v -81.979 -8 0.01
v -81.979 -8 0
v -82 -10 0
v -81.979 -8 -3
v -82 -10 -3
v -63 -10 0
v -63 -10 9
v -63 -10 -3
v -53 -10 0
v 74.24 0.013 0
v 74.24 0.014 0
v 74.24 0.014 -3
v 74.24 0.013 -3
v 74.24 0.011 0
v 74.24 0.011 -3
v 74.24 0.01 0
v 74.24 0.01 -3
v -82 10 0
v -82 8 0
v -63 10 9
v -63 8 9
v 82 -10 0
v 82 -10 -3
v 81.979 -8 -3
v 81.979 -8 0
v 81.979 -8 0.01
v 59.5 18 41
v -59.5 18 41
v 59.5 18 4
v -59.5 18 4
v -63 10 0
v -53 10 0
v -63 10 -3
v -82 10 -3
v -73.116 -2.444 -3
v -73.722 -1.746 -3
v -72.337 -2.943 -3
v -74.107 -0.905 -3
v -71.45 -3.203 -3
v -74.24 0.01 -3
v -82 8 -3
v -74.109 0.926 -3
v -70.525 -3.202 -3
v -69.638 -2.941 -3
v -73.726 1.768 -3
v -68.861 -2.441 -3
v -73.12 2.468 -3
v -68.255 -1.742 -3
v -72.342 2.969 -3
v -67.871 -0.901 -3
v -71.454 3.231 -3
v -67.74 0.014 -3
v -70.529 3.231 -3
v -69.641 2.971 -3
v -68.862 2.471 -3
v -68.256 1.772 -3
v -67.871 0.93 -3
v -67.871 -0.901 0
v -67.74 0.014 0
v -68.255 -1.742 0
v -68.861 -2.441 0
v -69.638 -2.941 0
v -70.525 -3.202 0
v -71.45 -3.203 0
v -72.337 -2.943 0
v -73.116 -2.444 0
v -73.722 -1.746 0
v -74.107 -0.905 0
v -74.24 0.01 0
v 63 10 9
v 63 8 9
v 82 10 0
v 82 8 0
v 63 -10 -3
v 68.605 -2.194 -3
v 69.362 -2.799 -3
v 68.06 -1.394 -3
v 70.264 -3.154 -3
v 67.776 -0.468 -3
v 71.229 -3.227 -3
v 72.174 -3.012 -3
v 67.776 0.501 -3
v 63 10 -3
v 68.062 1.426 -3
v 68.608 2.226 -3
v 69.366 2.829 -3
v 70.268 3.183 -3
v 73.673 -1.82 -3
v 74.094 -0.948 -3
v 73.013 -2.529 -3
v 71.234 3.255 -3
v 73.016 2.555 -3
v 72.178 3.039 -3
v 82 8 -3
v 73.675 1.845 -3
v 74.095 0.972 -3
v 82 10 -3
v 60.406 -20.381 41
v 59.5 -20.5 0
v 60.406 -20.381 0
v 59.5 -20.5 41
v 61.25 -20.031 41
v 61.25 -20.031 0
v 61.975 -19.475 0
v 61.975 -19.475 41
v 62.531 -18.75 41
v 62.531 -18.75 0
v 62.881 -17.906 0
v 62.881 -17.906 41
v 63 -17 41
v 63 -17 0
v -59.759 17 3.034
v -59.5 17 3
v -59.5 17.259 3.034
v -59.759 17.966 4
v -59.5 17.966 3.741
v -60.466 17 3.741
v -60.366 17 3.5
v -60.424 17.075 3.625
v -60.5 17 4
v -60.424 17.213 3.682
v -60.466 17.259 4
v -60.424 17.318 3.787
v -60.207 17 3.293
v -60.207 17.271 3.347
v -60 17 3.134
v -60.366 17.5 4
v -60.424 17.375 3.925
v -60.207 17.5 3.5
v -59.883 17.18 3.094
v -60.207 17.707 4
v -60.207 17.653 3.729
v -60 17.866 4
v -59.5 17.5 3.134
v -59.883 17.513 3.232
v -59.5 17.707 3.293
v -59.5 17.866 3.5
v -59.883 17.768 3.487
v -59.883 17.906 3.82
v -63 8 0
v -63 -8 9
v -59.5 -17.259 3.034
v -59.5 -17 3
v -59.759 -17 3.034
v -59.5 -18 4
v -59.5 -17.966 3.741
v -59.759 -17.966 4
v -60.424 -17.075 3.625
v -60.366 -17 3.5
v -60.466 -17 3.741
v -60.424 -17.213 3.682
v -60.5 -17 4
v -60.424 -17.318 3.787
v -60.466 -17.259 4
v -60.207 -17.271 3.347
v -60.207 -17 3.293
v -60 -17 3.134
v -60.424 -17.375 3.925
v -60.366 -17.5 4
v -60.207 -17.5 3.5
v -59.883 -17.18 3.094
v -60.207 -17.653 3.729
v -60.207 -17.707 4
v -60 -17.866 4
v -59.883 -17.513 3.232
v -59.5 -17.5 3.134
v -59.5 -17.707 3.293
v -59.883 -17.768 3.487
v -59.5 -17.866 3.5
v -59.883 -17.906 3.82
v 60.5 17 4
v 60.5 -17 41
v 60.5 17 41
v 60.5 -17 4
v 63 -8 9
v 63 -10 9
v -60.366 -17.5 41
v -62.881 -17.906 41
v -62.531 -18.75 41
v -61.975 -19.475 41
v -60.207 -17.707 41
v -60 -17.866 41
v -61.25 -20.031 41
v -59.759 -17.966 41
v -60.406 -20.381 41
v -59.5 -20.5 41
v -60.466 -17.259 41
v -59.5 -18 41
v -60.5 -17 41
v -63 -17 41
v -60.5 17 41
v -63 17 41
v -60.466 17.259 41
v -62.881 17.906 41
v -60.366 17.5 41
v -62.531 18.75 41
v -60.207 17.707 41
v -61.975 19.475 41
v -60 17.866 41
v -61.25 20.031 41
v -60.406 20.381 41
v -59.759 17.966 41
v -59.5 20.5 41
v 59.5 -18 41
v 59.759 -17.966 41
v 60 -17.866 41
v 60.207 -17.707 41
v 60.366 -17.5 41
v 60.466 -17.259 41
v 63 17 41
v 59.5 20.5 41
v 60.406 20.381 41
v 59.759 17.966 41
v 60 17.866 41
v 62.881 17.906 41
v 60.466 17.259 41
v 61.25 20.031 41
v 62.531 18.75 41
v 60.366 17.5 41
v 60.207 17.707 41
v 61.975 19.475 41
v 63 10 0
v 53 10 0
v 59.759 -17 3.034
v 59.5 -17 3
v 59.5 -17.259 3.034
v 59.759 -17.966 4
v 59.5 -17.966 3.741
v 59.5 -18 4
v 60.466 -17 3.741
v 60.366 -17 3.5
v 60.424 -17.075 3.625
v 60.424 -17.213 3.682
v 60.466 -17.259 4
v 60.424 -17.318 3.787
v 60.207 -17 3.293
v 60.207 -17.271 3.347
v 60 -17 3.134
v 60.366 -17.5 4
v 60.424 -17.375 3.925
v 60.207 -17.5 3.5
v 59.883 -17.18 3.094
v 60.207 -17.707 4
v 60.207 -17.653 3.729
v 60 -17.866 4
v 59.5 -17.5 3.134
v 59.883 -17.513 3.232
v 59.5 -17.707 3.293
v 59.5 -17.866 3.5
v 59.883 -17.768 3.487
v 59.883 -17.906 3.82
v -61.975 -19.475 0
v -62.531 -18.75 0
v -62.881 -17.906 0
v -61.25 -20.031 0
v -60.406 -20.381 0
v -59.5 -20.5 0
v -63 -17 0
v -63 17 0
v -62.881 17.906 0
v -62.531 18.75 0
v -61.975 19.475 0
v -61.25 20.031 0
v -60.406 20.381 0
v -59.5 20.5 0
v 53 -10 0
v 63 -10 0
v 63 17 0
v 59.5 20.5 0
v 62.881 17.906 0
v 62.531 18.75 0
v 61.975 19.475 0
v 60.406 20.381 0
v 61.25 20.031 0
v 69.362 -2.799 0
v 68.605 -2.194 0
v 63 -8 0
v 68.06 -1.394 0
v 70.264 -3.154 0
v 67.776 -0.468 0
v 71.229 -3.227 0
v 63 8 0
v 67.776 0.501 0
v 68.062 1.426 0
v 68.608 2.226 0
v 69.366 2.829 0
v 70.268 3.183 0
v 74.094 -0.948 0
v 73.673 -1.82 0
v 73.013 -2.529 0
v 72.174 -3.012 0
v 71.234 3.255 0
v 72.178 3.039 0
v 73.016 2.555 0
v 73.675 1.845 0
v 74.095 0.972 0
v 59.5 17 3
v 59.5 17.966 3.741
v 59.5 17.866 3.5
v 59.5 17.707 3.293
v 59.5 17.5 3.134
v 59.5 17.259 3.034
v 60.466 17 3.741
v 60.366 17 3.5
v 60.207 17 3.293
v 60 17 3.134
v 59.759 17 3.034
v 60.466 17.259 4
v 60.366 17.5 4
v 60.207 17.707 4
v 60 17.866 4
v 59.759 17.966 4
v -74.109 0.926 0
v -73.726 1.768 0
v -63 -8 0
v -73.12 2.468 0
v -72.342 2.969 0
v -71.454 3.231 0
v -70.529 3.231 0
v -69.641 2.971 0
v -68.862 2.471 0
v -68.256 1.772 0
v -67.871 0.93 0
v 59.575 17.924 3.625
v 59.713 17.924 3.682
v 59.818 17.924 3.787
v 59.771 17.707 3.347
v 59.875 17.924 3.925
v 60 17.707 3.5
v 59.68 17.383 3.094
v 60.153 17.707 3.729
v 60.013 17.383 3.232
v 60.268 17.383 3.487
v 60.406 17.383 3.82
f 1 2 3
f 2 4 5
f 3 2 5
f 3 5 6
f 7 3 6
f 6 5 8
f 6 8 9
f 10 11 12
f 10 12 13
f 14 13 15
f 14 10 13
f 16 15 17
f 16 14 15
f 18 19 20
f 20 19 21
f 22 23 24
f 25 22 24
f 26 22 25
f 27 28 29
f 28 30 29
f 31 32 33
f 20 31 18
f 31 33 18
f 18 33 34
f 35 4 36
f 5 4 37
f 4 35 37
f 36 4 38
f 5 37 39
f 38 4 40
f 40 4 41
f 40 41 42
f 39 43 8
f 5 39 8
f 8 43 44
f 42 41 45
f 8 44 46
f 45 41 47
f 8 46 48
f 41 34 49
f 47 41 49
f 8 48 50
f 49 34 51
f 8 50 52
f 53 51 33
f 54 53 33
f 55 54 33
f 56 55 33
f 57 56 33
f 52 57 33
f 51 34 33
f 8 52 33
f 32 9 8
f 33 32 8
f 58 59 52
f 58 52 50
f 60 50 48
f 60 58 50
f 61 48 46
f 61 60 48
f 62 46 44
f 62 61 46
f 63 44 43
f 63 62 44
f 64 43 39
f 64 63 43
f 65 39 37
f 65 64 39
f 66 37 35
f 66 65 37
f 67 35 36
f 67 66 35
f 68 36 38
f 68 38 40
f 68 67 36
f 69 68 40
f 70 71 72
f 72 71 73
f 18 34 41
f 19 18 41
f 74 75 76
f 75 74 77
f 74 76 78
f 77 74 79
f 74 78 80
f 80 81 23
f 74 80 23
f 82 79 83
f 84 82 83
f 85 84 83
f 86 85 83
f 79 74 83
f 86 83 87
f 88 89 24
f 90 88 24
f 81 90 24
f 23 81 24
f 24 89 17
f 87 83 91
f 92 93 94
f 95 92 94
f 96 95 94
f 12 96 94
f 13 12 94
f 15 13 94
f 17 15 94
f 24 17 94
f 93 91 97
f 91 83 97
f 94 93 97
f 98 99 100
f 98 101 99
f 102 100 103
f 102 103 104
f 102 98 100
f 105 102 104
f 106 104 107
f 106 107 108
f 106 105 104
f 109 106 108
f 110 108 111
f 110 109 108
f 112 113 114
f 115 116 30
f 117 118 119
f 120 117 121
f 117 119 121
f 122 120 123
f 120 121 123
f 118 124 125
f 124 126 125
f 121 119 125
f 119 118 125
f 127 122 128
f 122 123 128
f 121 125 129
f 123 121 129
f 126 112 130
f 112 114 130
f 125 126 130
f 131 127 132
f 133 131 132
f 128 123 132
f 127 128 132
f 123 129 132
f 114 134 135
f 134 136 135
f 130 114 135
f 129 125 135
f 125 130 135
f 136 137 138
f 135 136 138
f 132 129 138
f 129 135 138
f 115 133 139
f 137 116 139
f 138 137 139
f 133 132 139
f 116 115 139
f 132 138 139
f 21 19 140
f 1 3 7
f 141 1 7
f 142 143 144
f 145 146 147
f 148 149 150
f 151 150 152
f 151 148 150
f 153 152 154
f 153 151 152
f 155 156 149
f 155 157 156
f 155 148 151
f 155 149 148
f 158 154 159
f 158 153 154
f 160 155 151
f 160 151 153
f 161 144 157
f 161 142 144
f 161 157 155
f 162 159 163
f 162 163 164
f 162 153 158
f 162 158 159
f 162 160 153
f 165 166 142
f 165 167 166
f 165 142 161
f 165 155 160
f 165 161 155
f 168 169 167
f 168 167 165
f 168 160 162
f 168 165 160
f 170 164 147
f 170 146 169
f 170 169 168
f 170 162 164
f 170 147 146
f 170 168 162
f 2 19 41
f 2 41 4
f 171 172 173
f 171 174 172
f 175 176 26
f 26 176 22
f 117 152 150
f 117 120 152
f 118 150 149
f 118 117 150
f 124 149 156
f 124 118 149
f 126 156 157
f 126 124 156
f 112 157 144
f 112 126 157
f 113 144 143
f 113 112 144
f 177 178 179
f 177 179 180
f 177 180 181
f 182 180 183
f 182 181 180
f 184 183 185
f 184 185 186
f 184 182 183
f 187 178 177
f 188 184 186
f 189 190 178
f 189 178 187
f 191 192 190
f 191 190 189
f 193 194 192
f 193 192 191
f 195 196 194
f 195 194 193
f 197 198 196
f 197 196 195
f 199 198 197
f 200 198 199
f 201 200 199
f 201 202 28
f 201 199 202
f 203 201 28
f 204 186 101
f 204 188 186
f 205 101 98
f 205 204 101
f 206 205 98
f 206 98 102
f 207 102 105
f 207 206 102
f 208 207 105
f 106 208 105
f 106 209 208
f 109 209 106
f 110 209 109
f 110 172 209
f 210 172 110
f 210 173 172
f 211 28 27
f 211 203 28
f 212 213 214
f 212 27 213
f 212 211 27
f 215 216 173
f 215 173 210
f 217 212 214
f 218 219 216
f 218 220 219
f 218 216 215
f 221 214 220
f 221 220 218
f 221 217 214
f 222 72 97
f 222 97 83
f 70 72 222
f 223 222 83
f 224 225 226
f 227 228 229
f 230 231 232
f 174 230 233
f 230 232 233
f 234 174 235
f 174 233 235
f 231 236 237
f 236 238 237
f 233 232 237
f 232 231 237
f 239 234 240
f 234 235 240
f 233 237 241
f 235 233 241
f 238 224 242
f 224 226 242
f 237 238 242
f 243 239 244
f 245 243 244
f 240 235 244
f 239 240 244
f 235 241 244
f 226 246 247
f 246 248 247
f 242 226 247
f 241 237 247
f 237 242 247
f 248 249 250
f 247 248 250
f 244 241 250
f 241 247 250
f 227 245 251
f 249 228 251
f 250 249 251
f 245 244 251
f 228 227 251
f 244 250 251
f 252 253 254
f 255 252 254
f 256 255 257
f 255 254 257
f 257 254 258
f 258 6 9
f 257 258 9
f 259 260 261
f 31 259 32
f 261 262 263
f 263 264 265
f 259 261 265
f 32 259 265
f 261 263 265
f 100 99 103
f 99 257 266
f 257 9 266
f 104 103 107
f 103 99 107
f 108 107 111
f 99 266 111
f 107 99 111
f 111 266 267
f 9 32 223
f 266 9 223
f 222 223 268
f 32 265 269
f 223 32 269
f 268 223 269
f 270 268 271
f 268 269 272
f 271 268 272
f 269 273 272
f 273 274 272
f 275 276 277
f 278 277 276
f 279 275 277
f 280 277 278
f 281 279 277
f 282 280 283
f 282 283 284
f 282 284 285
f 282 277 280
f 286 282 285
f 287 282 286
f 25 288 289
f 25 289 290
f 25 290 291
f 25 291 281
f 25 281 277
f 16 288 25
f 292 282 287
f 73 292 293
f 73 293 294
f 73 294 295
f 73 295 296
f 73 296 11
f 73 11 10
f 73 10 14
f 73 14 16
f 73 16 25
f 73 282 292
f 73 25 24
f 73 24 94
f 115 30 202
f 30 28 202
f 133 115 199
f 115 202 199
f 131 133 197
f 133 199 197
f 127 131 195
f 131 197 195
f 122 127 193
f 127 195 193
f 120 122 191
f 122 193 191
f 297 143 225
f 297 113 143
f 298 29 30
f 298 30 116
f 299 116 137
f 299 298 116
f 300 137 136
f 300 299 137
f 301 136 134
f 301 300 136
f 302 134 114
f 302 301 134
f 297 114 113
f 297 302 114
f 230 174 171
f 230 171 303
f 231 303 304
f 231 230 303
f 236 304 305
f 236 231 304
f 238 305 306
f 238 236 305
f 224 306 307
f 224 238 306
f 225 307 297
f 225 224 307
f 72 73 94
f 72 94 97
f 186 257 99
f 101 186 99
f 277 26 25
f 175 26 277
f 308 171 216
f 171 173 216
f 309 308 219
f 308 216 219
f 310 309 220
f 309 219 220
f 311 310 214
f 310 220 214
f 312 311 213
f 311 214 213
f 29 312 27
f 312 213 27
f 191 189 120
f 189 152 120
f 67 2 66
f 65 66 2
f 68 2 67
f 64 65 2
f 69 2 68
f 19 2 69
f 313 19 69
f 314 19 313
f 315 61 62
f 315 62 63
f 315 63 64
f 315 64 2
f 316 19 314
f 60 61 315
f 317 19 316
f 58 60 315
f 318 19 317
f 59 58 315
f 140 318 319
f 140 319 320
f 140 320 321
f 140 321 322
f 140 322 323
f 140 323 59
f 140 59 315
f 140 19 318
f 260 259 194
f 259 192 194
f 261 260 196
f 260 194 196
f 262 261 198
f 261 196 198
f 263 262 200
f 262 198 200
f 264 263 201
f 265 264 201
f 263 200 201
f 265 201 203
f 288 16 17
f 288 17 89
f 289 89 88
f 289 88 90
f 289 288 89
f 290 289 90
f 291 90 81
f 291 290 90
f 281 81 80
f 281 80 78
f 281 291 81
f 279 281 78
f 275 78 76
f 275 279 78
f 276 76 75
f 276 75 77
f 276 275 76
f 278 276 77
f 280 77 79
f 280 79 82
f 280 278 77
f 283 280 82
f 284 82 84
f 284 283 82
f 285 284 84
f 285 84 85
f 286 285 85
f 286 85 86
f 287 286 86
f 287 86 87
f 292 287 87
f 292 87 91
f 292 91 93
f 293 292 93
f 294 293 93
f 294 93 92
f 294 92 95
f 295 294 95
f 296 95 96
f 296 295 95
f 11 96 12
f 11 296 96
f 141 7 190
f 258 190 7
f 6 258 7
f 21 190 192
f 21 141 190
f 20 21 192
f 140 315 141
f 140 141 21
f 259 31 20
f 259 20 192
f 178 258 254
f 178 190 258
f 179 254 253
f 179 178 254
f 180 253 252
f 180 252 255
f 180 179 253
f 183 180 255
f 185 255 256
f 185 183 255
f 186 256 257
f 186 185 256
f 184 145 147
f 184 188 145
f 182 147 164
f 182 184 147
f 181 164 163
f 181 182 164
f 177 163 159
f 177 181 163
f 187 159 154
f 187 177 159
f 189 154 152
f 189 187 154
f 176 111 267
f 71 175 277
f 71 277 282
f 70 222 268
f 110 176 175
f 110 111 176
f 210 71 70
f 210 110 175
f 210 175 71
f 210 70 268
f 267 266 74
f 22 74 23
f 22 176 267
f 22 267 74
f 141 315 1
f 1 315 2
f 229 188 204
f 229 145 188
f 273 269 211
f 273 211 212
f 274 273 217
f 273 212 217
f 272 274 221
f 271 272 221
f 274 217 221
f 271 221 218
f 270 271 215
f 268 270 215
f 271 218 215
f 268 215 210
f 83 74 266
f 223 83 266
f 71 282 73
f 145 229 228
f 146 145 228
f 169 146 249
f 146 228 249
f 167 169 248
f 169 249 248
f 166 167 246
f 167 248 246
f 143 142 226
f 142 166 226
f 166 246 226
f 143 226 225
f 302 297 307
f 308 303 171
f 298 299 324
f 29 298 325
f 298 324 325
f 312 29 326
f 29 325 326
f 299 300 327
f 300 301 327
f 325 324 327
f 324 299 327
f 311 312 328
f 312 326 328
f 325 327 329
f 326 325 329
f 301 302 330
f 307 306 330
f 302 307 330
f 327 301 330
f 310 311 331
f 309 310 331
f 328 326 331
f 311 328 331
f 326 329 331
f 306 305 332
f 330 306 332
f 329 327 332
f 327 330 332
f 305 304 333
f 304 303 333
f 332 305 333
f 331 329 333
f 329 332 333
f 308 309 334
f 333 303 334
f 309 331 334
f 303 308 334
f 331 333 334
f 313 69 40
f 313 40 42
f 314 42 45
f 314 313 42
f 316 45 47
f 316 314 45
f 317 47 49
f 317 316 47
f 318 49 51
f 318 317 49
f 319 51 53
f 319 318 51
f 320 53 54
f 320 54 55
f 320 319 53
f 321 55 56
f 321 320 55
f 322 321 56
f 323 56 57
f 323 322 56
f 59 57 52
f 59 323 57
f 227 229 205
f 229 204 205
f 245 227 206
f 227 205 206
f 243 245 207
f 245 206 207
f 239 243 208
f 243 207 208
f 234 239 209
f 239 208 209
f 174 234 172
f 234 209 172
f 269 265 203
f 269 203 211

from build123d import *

# Parameters (mm, degrees)
F0_W     = 126
F0_H     = 41
F0_W_2   = 121
F0_H_2   = 36
F1_DEPTH = 41
F2_DEPTH = 3
F3_W     = 10
F3_H     = 2
F3_H_2   = 16
F4_DEPTH = 3
F5_DEPTH = 3
F6_DEPTH = 6
F8_DEPTH = 20
F9_R     = 3.5
F10_R    = 1


with BuildPart() as f1:
    # F0 (on Top) → F1 (new body)
    with BuildSketch(Plane.XY):
        Rectangle(F0_W, F0_H)
        Rectangle(F0_W_2, F0_H_2, mode=Mode.SUBTRACT)
    extrude(amount=F1_DEPTH)

    # F0 (on Top) → F2 (join)
    with BuildSketch(Plane.XY):
        Rectangle(F0_W_2, F0_H_2)
    extrude(amount=F2_DEPTH)

    # F3 (on Top) → F4 (join, symmetric)
    with BuildSketch(Plane.XY):
        Polygon((-82, 8), (-81.9793343544, 8), (-63, 8), (-63, 10), (-82, 10), align=None)
        with Locations((-58, 9)):
            Rectangle(F3_W, F3_H)
        with Locations((-58, 0)):
            Rectangle(F3_W, F3_H_2)
        Polygon((-63, -10), (-63, -8), (-81.9793343544, -8), (-82, -10), align=None)
        with Locations((-58, -9)):
            Rectangle(F3_W, F3_H)
        Polygon((81.9793343544, -8), (63, -8), (63, -10), (82, -10), align=None)
        with Locations((58, -9)):
            Rectangle(F3_W, F3_H)
        with Locations((58, 0)):
            Rectangle(F3_W, F3_H_2)
        with Locations((58, 9)):
            Rectangle(F3_W, F3_H)
        Polygon((63, 8), (81.9793343544, 8), (82, 8), (82, 10), (63, 10), align=None)
    extrude(amount=F4_DEPTH, both=True)

    # F3 (on Top) → F5 (join)
    with BuildSketch(Plane.XY):
        Polygon((82, 8), (81.9793343544, 8), (63, 8), (63, -8), (81.9793343544, -8), (81.9896671772, 0), align=None)
        with BuildLine():
            ThreePointArc((74.2396763525, 0.0142076195), (74.2396756748, 0.0121087662), (74.2396736416, 0.0100099137))
            ThreePointArc((74.2396736416, 0.0100099137), (67.7396770302, 0.0163064728), (74.2396763525, 0.0142076195))
        make_face(mode=Mode.SUBTRACT)
        Polygon((-63, 8), (-81.9793343544, 8), (-82, 8), (-81.9896671772, 0), (-81.9793343544, -8), (-63, -8), align=None)
        with BuildLine():
            ThreePointArc((-67.7396763525, 0.0142076195), (-70.9875774992, -3.2357917028), (-74.2396736416, 0.0100099137))
            ThreePointArc((-74.2396736416, 0.0100099137), (-70.9917752058, 3.2642069418), (-67.7396763525, 0.0142076195))
        make_face(mode=Mode.SUBTRACT)
    extrude(amount=-F5_DEPTH)

    # F6 (add): faces of the model
    f6_faces = [f1.faces().sort_by_distance(p)[0] for p in [
        (-72.5, 9, 3),
        (-72.4948345257, -9.0001813762, 3),
        (72.5, 9, 3),
        (72.4948345257, -9.0001813762, 3),
    ]]
    extrude(f6_faces, amount=F6_DEPTH)

    # F7 (on face) → F8 (cut)
    with BuildSketch(Plane.XZ.offset(10)):
        Polygon((63, 9), (82, 0), (82, 9), align=None)
        Polygon((53, -3), (63, -3), (53, 0), align=None)
        Polygon((-82, 9), (-82, 0), (-63, 9), align=None)
        Polygon((-53, 0), (-63, -3), (-53, -3), align=None)
    extrude(amount=-F8_DEPTH, mode=Mode.SUBTRACT)

    # F9
    f9_edges = [f1.edges().sort_by_distance(p)[0] for p in [
        (-63, -20.5, 20.5),
        (-63, 20.5, 20.5),
        (63, 20.5, 20.5),
        (63, -20.5, 20.5),
    ]]
    fillet(f9_edges, radius=F9_R)

    # F10
    f10_edges = [f1.edges().sort_by_distance(p)[0] for p in [
        (0, -18, 3),
        (60.5, 0, 3),
        (60.5, -18, 22),
        (0, 18, 3),
        (60.5, 18, 22),
        (-60.5, 0, 3),
        (-60.5, 18, 22),
        (-60.5, -18, 22),
    ]]
    fillet(f10_edges, radius=F10_R)


solid = f1.part
